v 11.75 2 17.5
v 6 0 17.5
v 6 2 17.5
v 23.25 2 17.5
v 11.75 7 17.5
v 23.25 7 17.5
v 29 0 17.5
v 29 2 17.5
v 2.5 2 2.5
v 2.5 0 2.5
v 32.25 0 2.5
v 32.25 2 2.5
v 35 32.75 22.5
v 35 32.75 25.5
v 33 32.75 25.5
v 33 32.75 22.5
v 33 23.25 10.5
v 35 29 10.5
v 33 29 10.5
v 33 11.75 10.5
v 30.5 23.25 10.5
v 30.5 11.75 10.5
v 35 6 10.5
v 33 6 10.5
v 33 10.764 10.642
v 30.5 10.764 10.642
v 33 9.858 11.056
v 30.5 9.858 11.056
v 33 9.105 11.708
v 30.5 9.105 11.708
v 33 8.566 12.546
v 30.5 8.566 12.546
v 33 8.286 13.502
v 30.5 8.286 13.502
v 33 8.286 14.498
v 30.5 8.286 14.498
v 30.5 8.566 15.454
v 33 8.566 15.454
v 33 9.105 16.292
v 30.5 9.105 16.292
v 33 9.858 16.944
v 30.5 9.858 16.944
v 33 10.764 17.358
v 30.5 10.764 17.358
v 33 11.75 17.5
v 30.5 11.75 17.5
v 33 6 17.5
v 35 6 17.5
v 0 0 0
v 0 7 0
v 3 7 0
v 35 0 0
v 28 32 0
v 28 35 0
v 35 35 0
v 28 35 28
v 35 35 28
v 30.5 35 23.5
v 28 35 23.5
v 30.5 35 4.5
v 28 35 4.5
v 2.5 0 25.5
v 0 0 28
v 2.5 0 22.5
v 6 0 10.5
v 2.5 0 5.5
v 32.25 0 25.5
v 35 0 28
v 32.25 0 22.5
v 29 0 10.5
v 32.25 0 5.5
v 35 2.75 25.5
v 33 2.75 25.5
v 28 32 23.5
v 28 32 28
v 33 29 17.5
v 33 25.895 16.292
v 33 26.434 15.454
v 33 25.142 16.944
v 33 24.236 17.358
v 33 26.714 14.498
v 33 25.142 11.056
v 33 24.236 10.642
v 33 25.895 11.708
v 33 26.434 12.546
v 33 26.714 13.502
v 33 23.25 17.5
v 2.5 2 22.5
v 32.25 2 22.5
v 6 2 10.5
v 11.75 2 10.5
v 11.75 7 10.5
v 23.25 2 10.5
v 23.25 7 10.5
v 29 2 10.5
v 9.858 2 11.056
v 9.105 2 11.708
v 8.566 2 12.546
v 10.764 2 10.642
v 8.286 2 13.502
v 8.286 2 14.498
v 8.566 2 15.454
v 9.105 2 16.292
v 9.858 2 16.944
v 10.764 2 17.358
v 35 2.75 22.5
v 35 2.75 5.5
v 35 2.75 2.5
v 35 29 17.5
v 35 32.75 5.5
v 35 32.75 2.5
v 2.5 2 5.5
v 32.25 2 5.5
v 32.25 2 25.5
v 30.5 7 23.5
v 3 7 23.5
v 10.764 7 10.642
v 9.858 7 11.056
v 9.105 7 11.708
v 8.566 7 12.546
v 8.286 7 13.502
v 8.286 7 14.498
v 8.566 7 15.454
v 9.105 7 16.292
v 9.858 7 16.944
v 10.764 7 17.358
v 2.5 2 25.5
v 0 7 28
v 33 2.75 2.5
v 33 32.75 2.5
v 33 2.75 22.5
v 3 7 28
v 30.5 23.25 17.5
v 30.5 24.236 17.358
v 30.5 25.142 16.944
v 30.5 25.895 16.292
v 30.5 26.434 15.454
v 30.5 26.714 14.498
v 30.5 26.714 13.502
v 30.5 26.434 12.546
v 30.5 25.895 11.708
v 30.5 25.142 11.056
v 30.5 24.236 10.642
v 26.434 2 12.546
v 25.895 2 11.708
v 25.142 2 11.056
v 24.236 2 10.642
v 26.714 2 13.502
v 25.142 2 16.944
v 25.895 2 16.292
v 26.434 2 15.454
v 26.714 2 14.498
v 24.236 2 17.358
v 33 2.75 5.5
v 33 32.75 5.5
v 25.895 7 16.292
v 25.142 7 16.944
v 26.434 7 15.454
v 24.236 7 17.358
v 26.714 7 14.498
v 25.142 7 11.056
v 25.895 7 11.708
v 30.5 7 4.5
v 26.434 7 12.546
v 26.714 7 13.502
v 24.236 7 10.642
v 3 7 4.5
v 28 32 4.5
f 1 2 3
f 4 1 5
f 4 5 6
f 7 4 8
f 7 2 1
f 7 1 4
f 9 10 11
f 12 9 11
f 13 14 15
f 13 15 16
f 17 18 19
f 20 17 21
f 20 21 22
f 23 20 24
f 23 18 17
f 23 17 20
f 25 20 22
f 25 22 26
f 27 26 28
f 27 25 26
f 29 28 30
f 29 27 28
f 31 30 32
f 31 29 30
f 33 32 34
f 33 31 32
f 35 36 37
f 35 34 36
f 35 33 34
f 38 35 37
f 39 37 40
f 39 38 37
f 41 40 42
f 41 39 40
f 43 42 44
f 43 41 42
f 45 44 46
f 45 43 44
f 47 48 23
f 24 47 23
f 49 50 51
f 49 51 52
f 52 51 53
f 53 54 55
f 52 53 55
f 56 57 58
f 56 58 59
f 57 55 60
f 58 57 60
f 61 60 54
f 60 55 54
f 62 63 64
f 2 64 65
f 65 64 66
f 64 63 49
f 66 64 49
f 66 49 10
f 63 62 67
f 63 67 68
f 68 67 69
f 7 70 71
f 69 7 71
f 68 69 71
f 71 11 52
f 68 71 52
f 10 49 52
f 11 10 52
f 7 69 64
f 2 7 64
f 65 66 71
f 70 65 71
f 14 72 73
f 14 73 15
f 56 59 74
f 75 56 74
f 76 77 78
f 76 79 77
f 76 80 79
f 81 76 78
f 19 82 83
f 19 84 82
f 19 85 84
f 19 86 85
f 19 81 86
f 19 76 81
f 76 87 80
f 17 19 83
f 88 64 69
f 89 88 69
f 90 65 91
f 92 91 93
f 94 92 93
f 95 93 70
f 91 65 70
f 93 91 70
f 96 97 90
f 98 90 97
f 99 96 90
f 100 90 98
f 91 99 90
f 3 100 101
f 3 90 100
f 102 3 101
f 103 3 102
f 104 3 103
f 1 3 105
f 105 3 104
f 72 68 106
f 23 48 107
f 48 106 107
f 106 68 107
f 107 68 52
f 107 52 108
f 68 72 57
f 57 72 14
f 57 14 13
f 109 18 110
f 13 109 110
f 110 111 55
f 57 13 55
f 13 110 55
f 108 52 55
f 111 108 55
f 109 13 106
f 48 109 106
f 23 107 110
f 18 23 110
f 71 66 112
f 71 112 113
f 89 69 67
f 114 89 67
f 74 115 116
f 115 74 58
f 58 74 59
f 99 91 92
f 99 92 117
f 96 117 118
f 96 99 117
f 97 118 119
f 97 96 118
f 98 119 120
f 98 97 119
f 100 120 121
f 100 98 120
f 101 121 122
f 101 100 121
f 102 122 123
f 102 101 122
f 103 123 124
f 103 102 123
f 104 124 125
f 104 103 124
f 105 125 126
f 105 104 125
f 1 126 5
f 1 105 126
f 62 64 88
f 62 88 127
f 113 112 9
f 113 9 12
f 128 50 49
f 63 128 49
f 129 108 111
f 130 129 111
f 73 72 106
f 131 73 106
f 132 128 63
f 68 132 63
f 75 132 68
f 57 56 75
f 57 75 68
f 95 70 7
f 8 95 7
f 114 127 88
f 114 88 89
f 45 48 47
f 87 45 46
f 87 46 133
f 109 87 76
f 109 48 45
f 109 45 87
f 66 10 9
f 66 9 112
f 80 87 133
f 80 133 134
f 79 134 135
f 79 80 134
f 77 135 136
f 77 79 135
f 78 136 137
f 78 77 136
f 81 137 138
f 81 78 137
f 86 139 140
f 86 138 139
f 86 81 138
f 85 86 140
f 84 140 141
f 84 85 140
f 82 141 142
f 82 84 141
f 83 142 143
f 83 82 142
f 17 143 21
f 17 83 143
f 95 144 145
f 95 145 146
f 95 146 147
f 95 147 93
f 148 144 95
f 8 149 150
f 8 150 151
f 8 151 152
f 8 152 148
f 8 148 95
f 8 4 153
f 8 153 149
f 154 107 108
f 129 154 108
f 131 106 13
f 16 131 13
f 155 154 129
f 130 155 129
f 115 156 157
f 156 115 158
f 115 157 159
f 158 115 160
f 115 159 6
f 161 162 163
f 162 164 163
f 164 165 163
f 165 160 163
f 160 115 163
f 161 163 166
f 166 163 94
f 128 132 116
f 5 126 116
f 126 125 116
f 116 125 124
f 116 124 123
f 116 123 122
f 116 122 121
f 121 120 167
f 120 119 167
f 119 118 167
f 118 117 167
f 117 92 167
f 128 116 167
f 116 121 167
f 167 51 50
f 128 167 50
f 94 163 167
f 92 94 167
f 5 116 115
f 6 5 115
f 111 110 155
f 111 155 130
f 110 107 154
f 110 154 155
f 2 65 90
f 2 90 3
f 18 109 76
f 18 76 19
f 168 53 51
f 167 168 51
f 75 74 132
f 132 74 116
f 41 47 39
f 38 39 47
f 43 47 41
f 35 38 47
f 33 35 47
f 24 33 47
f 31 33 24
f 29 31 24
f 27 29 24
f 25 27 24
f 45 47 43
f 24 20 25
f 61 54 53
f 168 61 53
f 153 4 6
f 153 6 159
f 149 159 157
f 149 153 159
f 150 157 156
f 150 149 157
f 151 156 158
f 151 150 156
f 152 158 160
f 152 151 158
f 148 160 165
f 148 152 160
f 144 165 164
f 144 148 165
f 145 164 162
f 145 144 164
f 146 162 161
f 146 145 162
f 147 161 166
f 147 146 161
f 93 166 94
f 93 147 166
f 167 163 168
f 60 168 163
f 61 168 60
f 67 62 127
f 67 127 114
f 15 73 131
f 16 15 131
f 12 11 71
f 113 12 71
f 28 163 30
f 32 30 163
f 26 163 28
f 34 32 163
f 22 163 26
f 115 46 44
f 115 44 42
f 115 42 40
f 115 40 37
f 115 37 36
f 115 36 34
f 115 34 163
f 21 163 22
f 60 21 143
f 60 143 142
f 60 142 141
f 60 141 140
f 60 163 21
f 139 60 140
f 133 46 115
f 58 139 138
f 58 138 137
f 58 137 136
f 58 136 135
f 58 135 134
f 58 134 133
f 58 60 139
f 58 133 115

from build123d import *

# Parameters (mm, degrees)
BOSS_EXTRUDE1_DEPTH = 28
SKETCH3_W           = 19
SKETCH3_H           = 28
CUT_EXTRUDE1_DEPTH  = 30.5
SKETCH4_W           = 3
SKETCH4_H           = 30
CUT_EXTRUDE2_DEPTH  = 2
CUT_EXTRUDE3_DEPTH  = 36
SKETCH6_W           = 7
SKETCH6_H           = 23
CUT_EXTRUDE4_DEPTH  = 2
SKETCH11_W          = 29.75
SKETCH11_H          = 3
SKETCH11_W_2        = 23
SKETCH11_H_2        = 7
CUT_EXTRUDE6_DEPTH  = 2
CUT_EXTRUDE7_DEPTH  = 34


with BuildPart() as part:
    # Sketch1 → Boss-Extrude1 (new body)
    with BuildSketch(Plane.XY):
        Polygon((0, 0), (35, 0), (35, 35), (28, 35), (28, 32), (3, 7), (0, 7), align=None)
    extrude(amount=BOSS_EXTRUDE1_DEPTH)

    # Sketch3 → Cut-Extrude1 (cut)
    with BuildSketch(Plane.ZY):
        with Locations((14, 21)):
            Rectangle(SKETCH3_W, SKETCH3_H)
    extrude(amount=-CUT_EXTRUDE1_DEPTH, mode=Mode.SUBTRACT)

    # Sketch4 → Cut-Extrude2 (cut)
    with BuildSketch(Plane(origin=(35, 0, 0), x_dir=(0, 0, -1), z_dir=(1, 0, 0))):
        with Locations((-24, 17.75)):
            Rectangle(SKETCH4_W, SKETCH4_H)
        with Locations((-4, 17.75)):
            Rectangle(SKETCH4_W, SKETCH4_H)
    extrude(amount=-CUT_EXTRUDE2_DEPTH, mode=Mode.SUBTRACT)

    # Sketch5 → Cut-Extrude3 (cut, through all)
    with BuildSketch(Plane(origin=(35, 0, 0), x_dir=(0, 0, -1), z_dir=(1, 0, 0))):
        with BuildLine():
            Line((-10.5, 23.25), (-10.5, 11.75))
            ThreePointArc((-10.5, 11.75), (-14, 8.25), (-17.5, 11.75))
            Line((-17.5, 11.75), (-17.5, 23.25))
            ThreePointArc((-17.5, 23.25), (-14, 26.75), (-10.5, 23.25))
        make_face()
    extrude(amount=-CUT_EXTRUDE3_DEPTH, mode=Mode.SUBTRACT)

    # Sketch6 → Cut-Extrude4 (cut)
    with BuildSketch(Plane(origin=(35, 0, 0), x_dir=(0, 0, -1), z_dir=(1, 0, 0))):
        with Locations((-14, 17.5)):
            Rectangle(SKETCH6_W, SKETCH6_H)
    extrude(amount=-CUT_EXTRUDE4_DEPTH, mode=Mode.SUBTRACT)

    # Sketch11 → Cut-Extrude6 (cut)
    with BuildSketch(Plane.XZ):
        with Locations((17.375, 24)):
            Rectangle(SKETCH11_W, SKETCH11_H)
        with Locations((17.375, 4)):
            Rectangle(SKETCH11_W, SKETCH11_H)
        with Locations((17.5, 14)):
            Rectangle(SKETCH11_W_2, SKETCH11_H_2)
    extrude(amount=-CUT_EXTRUDE6_DEPTH, mode=Mode.SUBTRACT)

    # Sketch12 → Cut-Extrude7 (cut, through all)
    with BuildSketch(Plane.XZ.offset(-2)):
        with BuildLine():
            Line((11.75, 17.5), (23.25, 17.5))
            ThreePointArc((23.25, 17.5), (26.75, 14), (23.25, 10.5))
            Line((23.25, 10.5), (11.75, 10.5))
            ThreePointArc((11.75, 10.5), (8.25, 14), (11.75, 17.5))
        make_face()
    extrude(amount=-CUT_EXTRUDE7_DEPTH, mode=Mode.SUBTRACT)


solid = part.part
